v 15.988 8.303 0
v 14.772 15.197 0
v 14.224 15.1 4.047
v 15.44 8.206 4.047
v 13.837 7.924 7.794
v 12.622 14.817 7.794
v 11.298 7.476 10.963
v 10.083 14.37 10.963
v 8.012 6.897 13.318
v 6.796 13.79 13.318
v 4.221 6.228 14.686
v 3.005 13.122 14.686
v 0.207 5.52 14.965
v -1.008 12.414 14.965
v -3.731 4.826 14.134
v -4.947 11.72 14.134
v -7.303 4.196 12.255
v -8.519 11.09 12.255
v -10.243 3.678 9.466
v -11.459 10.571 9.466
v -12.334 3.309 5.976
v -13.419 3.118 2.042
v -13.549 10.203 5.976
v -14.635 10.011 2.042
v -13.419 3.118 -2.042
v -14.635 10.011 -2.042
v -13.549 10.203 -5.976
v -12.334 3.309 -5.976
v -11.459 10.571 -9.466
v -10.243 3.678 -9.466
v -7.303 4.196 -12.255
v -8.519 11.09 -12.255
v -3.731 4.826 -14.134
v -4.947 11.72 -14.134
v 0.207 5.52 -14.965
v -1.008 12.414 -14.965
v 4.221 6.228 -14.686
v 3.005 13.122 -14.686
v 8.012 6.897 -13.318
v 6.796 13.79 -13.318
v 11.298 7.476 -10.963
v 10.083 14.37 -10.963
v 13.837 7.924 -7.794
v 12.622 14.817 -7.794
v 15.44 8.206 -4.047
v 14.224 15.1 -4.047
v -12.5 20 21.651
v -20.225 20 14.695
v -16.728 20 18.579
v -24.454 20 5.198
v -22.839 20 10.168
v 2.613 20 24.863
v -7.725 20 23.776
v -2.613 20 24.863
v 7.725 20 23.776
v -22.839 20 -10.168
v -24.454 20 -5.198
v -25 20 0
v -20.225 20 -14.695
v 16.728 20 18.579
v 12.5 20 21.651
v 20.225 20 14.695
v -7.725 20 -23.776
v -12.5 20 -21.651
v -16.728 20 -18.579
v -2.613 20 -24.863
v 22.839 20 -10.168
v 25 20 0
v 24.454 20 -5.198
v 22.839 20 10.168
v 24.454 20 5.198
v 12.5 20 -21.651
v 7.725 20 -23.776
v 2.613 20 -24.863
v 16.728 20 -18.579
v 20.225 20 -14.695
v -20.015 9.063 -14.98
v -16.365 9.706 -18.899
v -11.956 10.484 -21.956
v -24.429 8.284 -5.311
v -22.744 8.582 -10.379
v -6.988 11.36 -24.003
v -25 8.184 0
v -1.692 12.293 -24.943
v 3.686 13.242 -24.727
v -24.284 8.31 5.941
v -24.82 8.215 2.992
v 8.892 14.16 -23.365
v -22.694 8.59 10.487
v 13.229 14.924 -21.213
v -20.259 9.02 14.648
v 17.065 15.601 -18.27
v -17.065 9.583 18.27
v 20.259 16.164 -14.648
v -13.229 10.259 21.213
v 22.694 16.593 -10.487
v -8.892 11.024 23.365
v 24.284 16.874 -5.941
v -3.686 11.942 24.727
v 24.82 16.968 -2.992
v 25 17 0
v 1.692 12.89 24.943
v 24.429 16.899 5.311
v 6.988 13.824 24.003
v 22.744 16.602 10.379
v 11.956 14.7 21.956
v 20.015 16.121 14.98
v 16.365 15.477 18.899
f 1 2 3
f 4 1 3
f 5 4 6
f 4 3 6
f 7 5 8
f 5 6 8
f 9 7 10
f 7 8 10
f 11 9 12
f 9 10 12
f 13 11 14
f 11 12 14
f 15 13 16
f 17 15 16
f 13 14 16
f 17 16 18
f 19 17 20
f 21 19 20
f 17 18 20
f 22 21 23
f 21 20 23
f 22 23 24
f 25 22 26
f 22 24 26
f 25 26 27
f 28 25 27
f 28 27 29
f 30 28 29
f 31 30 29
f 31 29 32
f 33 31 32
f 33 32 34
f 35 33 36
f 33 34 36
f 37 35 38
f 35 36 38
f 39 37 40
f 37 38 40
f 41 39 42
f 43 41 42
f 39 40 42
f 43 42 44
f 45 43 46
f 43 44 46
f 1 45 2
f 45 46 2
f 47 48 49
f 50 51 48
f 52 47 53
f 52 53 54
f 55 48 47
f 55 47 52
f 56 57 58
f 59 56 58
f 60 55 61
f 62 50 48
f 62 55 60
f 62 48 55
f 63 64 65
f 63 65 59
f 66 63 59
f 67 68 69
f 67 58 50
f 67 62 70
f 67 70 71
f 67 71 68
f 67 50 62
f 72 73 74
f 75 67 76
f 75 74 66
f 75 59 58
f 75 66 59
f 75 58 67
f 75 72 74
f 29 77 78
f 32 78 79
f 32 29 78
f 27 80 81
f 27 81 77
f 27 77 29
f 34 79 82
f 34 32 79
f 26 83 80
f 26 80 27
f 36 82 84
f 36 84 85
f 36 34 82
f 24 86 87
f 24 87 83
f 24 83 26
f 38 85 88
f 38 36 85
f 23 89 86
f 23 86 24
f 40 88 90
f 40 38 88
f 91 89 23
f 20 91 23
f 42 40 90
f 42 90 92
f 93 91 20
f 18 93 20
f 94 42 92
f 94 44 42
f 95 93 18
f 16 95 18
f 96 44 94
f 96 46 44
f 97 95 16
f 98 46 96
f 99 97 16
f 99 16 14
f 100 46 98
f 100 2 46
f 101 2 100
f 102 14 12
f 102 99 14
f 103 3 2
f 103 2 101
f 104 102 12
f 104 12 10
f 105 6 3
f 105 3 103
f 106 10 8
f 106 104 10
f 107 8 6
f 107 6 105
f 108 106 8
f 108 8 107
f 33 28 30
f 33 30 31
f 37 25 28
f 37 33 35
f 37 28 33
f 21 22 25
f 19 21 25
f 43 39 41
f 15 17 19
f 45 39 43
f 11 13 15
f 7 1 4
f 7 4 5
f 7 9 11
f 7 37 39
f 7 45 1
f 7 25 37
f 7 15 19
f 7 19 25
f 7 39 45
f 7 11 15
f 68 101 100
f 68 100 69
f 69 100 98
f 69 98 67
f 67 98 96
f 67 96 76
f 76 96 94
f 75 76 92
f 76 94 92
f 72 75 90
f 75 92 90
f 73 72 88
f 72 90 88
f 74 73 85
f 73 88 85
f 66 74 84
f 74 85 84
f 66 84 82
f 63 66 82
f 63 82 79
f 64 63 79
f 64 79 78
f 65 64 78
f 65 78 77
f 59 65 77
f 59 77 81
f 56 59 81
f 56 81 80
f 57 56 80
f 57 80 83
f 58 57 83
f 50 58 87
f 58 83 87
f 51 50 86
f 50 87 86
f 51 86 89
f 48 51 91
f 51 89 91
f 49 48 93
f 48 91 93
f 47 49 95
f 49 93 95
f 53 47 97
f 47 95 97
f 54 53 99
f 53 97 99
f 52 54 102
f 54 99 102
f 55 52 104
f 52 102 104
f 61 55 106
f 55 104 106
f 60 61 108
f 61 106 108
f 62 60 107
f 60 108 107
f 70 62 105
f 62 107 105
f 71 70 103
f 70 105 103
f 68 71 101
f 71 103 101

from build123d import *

# Parameters (mm, degrees)
SKETCH_5_R          = 25
EXTRUDE_4_DEPTH     = 20
CUT_EXTRUDE_2_DEPTH = 41
SKETCH_8_R          = 15
EXTRUDE_5_DEPTH     = 7


with BuildPart() as part:
    # 草图5 → 凸台-拉伸4 (new body)
    with BuildSketch(Plane(origin=(0, 0, 0), x_dir=(1, 0, 0), z_dir=(0, 1, 0))):
        Circle(SKETCH_5_R)
    extrude(amount=EXTRUDE_4_DEPTH)

    # 草图7 → 切除-拉伸2 (cut, symmetric)
    with BuildSketch(Plane.XY):
        Polygon((-25, 8.183650965), (25, 17), (25, -9.727272727), (-25, -9.727272727), align=None)
    extrude(amount=CUT_EXTRUDE_2_DEPTH, both=True, mode=Mode.SUBTRACT)

    # 草图8 → 凸台-拉伸5 (add)
    with BuildSketch(Plane(origin=(-2.153328978, 12.212135485, 0), x_dir=(0.984807753, 0.173648178, 0), z_dir=(0.173648178, -0.984807753, 0))):
        with Locations((2.186547548, 0)):
            Circle(SKETCH_8_R)
    extrude(amount=EXTRUDE_5_DEPTH)


solid = part.part
